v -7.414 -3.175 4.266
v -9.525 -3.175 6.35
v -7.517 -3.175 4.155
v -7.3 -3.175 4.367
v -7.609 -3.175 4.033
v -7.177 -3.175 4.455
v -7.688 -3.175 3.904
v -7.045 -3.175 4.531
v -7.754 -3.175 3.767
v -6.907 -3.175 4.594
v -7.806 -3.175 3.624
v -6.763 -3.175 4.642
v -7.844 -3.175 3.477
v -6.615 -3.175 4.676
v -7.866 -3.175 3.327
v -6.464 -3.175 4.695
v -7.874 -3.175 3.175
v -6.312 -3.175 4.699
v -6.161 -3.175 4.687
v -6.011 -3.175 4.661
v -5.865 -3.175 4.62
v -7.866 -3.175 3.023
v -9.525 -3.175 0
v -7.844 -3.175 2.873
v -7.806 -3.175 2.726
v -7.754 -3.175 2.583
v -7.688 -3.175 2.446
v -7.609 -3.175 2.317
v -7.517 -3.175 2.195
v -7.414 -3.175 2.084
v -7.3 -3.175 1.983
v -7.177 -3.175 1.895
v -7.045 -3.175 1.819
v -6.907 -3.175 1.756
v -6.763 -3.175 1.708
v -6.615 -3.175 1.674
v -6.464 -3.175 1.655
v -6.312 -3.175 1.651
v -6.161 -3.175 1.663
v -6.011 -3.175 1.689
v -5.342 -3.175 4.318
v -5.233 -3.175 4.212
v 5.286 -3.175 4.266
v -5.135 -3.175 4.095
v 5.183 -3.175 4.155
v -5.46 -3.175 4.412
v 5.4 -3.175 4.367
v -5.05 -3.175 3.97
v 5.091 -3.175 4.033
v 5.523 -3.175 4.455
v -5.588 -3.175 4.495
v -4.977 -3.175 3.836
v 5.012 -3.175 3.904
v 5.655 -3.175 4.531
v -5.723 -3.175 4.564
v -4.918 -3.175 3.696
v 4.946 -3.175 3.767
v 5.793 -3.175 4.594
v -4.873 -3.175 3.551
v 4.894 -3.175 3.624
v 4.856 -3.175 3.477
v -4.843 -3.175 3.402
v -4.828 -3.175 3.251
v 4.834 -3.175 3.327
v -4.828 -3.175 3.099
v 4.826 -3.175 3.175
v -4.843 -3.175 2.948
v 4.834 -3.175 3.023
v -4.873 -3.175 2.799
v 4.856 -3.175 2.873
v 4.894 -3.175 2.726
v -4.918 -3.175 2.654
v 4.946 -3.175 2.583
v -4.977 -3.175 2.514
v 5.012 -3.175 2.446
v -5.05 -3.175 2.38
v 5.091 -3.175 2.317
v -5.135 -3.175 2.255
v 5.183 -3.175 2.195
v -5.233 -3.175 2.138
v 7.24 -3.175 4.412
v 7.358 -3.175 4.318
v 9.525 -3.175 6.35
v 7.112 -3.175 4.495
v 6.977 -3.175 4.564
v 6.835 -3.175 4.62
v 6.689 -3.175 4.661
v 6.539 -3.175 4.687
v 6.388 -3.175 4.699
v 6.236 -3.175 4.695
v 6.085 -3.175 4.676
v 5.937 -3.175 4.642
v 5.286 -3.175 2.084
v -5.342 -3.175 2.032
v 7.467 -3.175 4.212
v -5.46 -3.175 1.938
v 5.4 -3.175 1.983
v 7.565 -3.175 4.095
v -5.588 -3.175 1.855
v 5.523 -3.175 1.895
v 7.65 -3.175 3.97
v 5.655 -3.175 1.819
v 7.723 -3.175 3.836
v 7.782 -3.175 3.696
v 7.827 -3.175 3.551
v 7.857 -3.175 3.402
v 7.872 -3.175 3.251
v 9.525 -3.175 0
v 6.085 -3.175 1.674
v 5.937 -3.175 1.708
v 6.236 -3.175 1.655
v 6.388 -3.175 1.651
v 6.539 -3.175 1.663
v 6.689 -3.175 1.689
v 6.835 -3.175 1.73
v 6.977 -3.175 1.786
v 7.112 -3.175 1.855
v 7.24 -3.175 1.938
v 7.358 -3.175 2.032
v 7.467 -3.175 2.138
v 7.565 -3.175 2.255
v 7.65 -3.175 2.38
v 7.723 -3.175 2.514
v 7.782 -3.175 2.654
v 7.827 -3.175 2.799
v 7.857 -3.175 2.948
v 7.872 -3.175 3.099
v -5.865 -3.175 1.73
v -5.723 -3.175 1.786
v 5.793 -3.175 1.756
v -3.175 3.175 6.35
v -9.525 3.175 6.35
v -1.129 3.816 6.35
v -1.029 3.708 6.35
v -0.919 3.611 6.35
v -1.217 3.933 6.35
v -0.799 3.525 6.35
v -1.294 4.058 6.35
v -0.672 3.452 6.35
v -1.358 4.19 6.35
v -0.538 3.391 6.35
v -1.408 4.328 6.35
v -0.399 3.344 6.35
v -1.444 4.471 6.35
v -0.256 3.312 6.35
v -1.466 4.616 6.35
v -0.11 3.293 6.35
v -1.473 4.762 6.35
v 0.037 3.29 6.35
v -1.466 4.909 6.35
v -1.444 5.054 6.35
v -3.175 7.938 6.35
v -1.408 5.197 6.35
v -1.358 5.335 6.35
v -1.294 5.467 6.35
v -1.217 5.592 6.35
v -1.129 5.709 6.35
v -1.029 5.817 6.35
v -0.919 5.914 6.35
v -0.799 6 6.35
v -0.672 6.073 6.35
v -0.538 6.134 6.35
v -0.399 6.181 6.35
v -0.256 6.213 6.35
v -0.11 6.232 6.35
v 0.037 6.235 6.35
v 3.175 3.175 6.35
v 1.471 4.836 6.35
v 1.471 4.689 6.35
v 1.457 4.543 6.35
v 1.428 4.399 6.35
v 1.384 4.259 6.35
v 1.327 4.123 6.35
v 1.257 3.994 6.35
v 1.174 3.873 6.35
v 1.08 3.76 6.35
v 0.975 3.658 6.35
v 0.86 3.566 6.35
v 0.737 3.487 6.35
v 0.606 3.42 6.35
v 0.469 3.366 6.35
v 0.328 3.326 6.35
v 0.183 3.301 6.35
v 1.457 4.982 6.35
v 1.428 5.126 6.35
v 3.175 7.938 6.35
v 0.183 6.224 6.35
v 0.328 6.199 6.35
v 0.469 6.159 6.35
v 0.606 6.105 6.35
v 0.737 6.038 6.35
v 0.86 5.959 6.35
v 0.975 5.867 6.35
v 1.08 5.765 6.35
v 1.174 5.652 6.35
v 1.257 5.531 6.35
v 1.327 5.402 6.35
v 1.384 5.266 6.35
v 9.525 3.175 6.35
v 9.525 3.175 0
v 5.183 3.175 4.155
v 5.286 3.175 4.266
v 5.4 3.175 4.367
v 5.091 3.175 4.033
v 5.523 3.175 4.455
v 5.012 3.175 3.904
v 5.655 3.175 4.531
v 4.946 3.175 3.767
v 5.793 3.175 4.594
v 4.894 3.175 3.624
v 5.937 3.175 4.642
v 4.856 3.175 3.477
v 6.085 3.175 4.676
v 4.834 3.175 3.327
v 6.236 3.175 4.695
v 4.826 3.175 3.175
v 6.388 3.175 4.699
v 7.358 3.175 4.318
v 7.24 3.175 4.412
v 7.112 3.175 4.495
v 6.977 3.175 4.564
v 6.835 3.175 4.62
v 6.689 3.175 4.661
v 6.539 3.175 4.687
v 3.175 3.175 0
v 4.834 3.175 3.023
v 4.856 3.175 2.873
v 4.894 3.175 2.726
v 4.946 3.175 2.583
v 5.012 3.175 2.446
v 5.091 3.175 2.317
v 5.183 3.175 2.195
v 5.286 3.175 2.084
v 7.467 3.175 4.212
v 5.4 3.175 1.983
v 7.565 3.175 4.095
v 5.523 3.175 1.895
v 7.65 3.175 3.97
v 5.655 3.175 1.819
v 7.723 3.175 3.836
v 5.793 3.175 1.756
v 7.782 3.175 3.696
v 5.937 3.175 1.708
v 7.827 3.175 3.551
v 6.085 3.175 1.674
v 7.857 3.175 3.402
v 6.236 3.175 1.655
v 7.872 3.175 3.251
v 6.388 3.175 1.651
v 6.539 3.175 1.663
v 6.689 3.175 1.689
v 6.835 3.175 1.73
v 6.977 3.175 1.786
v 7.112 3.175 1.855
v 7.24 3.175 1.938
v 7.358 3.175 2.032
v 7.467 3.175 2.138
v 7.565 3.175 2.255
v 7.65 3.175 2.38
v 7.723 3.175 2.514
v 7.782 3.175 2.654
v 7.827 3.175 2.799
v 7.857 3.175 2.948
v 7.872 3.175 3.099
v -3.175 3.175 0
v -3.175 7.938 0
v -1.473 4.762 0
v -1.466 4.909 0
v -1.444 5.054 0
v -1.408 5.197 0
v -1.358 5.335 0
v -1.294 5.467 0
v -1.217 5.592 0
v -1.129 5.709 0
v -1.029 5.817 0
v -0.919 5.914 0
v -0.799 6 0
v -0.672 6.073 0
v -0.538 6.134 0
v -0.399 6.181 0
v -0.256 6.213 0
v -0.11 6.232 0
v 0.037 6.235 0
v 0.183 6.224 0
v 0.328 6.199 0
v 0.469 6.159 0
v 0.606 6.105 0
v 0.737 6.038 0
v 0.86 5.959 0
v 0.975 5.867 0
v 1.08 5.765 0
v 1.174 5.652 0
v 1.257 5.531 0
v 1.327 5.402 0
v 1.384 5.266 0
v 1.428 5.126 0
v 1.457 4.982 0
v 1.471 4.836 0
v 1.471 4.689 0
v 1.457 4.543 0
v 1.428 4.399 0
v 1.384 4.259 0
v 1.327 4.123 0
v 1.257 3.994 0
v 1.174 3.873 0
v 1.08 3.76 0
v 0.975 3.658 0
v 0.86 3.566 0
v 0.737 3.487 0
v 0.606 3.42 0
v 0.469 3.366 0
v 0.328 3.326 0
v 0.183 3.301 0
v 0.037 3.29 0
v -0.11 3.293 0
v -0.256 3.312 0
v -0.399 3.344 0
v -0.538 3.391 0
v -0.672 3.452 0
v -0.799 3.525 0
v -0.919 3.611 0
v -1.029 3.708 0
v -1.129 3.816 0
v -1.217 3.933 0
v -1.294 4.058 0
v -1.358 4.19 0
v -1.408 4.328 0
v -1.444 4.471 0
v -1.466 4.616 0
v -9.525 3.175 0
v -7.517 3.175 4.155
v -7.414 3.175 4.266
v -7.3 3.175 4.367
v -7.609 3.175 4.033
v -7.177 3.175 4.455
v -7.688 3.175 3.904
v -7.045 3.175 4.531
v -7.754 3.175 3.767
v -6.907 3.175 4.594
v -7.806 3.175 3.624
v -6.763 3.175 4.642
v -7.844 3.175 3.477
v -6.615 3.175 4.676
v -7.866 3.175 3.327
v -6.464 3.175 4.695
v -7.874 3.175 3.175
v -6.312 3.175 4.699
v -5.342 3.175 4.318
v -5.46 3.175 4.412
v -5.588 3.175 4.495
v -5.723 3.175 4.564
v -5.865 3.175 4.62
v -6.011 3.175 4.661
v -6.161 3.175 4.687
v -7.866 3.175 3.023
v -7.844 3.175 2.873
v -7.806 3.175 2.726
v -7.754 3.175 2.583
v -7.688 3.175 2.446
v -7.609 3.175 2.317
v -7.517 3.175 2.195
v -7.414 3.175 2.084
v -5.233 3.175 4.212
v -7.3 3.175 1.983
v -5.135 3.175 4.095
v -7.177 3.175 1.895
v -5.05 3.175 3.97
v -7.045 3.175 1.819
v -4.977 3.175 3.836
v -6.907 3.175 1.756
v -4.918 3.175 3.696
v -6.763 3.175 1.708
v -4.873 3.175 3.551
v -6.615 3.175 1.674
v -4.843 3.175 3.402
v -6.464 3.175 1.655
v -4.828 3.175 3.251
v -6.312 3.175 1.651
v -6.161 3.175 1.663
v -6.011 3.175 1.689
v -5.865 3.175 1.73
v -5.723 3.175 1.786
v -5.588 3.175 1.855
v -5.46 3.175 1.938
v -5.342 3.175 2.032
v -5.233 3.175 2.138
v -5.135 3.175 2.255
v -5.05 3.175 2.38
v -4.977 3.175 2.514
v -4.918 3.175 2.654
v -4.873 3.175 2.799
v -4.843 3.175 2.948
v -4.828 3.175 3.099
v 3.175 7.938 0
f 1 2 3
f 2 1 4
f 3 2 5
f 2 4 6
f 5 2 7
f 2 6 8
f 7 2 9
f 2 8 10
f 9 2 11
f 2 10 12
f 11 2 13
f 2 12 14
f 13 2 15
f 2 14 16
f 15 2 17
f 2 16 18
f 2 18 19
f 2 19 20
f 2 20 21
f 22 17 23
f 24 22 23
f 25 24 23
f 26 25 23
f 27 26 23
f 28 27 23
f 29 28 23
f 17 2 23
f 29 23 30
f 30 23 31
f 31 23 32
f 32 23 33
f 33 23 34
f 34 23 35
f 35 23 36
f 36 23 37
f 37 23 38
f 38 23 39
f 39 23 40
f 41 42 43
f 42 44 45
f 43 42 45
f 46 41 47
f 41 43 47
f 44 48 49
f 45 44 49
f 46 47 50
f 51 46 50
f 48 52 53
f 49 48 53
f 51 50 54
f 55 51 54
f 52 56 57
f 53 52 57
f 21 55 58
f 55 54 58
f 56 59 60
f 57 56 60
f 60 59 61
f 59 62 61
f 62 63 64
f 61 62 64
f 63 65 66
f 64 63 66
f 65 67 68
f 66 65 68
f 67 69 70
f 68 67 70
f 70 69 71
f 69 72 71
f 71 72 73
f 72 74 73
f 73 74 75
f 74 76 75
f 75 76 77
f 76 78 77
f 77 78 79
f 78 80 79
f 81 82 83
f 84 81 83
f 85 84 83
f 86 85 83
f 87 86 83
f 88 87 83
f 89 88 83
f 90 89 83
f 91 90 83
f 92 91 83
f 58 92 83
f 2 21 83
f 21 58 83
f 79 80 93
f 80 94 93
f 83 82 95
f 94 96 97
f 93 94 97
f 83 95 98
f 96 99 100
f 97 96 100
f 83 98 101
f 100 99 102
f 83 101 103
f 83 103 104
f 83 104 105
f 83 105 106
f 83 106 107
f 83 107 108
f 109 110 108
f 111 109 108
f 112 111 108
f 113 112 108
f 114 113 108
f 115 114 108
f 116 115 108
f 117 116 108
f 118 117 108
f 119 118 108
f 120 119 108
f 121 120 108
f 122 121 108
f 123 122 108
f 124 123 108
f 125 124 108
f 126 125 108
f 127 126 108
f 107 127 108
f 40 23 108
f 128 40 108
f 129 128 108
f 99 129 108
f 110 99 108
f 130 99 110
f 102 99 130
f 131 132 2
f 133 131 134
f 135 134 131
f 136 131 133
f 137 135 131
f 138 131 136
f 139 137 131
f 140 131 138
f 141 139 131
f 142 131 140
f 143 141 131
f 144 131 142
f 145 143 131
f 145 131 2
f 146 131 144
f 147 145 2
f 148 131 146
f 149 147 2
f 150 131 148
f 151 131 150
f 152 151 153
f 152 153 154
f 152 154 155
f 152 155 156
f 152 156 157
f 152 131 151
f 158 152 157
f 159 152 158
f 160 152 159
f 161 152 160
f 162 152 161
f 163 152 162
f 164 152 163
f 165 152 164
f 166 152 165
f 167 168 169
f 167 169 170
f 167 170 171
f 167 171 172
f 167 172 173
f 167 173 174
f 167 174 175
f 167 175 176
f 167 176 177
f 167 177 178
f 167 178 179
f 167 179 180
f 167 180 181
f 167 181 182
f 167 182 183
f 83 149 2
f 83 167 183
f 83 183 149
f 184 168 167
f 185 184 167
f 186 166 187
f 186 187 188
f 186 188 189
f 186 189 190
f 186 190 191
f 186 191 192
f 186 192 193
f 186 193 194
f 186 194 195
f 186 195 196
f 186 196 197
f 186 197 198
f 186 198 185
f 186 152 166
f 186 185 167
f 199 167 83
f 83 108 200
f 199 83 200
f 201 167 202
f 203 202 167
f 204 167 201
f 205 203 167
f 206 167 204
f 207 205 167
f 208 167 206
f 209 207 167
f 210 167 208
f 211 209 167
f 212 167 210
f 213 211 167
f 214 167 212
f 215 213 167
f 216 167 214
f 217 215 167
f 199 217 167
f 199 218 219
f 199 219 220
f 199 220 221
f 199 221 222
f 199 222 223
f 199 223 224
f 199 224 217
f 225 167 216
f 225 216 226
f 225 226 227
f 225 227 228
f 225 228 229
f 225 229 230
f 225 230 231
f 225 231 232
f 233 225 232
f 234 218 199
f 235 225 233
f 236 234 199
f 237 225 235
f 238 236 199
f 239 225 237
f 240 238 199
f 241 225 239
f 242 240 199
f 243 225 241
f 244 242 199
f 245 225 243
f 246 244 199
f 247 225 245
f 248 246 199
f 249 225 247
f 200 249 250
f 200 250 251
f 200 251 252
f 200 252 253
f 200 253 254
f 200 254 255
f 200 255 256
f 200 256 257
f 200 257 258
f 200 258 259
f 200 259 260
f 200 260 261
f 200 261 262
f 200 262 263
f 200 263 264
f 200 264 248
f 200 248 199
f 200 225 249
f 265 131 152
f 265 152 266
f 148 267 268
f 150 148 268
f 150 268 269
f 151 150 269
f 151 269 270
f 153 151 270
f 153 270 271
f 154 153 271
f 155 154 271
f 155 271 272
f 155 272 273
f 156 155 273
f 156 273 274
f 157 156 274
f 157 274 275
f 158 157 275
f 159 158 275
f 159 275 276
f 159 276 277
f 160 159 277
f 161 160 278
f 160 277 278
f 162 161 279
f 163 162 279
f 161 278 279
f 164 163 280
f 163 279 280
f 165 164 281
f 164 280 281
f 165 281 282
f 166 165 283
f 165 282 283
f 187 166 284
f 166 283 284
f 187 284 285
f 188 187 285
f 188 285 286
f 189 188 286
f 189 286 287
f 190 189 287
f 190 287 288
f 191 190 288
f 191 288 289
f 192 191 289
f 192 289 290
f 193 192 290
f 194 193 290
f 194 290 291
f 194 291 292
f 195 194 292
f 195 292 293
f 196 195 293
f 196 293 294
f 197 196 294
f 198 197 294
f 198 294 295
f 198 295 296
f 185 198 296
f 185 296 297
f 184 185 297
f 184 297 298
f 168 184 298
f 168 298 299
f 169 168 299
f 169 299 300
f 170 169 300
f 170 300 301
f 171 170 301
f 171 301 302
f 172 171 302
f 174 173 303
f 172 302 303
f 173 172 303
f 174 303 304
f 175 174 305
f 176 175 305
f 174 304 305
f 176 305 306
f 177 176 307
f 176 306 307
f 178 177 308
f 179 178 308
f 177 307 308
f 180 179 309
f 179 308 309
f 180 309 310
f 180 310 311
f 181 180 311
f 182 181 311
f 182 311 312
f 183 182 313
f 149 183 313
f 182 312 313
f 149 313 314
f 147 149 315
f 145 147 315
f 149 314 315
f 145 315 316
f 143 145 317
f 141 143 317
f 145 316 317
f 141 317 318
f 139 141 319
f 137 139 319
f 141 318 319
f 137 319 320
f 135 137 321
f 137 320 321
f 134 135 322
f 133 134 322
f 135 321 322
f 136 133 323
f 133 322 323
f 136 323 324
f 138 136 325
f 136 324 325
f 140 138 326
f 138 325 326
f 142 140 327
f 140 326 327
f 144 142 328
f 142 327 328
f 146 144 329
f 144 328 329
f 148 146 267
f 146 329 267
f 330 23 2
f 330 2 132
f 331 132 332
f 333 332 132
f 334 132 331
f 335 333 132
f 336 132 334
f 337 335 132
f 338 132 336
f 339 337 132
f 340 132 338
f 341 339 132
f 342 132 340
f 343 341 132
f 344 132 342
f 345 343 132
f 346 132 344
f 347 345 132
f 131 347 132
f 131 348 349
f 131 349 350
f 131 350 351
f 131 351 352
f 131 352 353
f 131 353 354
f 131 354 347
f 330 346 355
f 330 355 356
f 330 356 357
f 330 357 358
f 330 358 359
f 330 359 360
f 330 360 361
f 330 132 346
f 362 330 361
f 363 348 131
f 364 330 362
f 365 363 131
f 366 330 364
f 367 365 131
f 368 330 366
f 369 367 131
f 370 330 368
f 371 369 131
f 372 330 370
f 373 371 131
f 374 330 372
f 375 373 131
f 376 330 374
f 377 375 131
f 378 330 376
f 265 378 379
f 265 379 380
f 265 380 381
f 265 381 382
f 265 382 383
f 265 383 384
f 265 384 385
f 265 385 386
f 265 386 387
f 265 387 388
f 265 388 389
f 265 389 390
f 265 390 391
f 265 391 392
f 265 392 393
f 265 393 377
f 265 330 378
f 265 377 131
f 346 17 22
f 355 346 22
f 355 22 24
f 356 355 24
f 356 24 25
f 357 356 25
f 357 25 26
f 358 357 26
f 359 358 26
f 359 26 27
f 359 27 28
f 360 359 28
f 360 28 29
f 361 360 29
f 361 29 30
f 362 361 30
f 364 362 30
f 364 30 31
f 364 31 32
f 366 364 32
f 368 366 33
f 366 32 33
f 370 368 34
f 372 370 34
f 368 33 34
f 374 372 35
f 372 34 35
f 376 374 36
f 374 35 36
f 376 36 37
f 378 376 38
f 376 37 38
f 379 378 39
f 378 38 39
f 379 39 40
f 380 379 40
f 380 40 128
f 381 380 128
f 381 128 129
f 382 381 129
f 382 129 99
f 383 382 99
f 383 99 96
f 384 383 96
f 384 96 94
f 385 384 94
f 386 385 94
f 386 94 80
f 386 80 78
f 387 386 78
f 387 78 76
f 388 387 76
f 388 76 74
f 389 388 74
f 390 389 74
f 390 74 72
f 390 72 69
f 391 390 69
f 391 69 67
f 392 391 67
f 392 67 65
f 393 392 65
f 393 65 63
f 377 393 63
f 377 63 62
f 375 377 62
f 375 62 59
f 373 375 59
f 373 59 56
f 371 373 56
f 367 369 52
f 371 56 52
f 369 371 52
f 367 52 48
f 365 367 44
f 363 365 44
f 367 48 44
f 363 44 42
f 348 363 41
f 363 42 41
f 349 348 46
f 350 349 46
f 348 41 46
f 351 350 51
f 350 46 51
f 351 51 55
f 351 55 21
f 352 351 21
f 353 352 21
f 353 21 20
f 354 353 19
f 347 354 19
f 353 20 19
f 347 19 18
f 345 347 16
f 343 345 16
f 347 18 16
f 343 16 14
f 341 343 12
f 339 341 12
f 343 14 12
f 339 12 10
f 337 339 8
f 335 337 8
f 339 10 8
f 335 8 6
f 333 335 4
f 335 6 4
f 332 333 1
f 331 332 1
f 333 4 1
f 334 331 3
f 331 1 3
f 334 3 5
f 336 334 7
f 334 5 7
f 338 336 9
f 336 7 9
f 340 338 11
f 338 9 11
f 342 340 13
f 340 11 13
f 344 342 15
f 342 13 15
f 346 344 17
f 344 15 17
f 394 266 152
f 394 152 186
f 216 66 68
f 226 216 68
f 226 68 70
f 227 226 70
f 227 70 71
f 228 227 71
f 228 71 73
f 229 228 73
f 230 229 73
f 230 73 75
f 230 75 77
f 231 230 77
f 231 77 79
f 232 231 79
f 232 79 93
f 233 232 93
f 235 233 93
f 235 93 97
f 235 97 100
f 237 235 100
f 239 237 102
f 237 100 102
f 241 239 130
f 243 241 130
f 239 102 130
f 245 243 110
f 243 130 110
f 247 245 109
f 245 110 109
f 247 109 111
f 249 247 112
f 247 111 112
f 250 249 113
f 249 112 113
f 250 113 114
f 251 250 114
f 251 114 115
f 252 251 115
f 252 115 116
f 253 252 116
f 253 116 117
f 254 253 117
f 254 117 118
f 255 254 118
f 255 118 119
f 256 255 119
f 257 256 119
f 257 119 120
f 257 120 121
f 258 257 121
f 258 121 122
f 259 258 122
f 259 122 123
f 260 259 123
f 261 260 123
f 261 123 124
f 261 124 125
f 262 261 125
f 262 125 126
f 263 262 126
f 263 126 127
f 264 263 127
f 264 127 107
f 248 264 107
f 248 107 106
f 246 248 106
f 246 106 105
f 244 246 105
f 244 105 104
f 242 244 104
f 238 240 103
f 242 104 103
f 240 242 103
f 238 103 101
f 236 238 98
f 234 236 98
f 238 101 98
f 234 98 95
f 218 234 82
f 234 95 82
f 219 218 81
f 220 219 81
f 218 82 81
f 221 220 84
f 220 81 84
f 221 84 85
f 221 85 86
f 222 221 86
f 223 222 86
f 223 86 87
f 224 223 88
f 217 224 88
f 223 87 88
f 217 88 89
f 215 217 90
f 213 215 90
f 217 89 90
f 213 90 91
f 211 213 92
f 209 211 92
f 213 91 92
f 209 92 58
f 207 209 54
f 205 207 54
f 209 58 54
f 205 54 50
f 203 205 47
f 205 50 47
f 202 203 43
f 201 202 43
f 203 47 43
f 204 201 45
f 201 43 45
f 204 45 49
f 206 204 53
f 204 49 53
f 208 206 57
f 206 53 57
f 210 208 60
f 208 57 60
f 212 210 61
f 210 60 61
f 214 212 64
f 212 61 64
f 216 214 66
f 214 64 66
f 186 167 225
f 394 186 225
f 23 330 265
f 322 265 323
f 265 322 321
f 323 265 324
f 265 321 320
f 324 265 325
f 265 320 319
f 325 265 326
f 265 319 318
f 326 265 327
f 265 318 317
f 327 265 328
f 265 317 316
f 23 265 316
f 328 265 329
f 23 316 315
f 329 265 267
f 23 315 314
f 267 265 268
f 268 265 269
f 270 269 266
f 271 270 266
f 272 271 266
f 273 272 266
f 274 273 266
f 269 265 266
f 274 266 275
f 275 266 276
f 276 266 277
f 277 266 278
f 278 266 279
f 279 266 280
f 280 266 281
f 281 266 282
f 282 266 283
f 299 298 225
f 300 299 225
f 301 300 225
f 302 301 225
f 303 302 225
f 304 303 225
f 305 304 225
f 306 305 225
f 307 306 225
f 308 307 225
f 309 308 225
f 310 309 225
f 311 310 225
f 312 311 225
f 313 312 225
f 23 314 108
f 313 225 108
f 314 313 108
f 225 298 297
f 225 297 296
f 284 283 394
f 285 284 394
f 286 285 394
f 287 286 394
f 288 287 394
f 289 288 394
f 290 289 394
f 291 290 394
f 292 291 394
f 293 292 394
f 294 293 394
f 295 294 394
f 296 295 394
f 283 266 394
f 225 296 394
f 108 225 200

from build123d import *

# Parameters (mm, degrees)
SKETCH1_W                        = 19.05
SKETCH1_H                        = 6.35
BOSS_EXTRUDE1_DEPTH              = 6.35
SKETCH6_W                        = 6.35
SKETCH6_H                        = 6.35
BOSS_EXTRUDE2_DEPTH              = 4.7625
TAPPED_HOLE_FOR_4_40_HELICOIL1_D = 3.048
F_4_CLEARANCE_HOLE2_D            = 2.9464


with BuildPart() as part:
    # Sketch1 → Boss-Extrude1 (new body)
    with BuildSketch(Plane.XY):
        Rectangle(SKETCH1_W, SKETCH1_H)
    extrude(amount=BOSS_EXTRUDE1_DEPTH)

    # Sketch6 → Boss-Extrude2 (add)
    with BuildSketch(Plane(origin=(0, 3.175, 0), x_dir=(1, 0, 0), z_dir=(0, 1, 0))):
        with Locations((0, -3.175)):
            Rectangle(SKETCH6_W, SKETCH6_H)
    extrude(amount=BOSS_EXTRUDE2_DEPTH)

    # Tapped Hole for #4-40 Helicoil1 (through all)
    with Locations(Plane(origin=(0, 3.175, 0), x_dir=(1, 0, 0), z_dir=(0, 1, 0))):
        with Locations((-6.35, -3.175), (6.35, -3.175)):
            Hole(TAPPED_HOLE_FOR_4_40_HELICOIL1_D / 2)

    # #4 Clearance Hole2 (through all)
    with Locations(Plane.XY.offset(6.35)):
        with Locations((0, 4.7625)):
            Hole(F_4_CLEARANCE_HOLE2_D / 2)


solid = part.part
